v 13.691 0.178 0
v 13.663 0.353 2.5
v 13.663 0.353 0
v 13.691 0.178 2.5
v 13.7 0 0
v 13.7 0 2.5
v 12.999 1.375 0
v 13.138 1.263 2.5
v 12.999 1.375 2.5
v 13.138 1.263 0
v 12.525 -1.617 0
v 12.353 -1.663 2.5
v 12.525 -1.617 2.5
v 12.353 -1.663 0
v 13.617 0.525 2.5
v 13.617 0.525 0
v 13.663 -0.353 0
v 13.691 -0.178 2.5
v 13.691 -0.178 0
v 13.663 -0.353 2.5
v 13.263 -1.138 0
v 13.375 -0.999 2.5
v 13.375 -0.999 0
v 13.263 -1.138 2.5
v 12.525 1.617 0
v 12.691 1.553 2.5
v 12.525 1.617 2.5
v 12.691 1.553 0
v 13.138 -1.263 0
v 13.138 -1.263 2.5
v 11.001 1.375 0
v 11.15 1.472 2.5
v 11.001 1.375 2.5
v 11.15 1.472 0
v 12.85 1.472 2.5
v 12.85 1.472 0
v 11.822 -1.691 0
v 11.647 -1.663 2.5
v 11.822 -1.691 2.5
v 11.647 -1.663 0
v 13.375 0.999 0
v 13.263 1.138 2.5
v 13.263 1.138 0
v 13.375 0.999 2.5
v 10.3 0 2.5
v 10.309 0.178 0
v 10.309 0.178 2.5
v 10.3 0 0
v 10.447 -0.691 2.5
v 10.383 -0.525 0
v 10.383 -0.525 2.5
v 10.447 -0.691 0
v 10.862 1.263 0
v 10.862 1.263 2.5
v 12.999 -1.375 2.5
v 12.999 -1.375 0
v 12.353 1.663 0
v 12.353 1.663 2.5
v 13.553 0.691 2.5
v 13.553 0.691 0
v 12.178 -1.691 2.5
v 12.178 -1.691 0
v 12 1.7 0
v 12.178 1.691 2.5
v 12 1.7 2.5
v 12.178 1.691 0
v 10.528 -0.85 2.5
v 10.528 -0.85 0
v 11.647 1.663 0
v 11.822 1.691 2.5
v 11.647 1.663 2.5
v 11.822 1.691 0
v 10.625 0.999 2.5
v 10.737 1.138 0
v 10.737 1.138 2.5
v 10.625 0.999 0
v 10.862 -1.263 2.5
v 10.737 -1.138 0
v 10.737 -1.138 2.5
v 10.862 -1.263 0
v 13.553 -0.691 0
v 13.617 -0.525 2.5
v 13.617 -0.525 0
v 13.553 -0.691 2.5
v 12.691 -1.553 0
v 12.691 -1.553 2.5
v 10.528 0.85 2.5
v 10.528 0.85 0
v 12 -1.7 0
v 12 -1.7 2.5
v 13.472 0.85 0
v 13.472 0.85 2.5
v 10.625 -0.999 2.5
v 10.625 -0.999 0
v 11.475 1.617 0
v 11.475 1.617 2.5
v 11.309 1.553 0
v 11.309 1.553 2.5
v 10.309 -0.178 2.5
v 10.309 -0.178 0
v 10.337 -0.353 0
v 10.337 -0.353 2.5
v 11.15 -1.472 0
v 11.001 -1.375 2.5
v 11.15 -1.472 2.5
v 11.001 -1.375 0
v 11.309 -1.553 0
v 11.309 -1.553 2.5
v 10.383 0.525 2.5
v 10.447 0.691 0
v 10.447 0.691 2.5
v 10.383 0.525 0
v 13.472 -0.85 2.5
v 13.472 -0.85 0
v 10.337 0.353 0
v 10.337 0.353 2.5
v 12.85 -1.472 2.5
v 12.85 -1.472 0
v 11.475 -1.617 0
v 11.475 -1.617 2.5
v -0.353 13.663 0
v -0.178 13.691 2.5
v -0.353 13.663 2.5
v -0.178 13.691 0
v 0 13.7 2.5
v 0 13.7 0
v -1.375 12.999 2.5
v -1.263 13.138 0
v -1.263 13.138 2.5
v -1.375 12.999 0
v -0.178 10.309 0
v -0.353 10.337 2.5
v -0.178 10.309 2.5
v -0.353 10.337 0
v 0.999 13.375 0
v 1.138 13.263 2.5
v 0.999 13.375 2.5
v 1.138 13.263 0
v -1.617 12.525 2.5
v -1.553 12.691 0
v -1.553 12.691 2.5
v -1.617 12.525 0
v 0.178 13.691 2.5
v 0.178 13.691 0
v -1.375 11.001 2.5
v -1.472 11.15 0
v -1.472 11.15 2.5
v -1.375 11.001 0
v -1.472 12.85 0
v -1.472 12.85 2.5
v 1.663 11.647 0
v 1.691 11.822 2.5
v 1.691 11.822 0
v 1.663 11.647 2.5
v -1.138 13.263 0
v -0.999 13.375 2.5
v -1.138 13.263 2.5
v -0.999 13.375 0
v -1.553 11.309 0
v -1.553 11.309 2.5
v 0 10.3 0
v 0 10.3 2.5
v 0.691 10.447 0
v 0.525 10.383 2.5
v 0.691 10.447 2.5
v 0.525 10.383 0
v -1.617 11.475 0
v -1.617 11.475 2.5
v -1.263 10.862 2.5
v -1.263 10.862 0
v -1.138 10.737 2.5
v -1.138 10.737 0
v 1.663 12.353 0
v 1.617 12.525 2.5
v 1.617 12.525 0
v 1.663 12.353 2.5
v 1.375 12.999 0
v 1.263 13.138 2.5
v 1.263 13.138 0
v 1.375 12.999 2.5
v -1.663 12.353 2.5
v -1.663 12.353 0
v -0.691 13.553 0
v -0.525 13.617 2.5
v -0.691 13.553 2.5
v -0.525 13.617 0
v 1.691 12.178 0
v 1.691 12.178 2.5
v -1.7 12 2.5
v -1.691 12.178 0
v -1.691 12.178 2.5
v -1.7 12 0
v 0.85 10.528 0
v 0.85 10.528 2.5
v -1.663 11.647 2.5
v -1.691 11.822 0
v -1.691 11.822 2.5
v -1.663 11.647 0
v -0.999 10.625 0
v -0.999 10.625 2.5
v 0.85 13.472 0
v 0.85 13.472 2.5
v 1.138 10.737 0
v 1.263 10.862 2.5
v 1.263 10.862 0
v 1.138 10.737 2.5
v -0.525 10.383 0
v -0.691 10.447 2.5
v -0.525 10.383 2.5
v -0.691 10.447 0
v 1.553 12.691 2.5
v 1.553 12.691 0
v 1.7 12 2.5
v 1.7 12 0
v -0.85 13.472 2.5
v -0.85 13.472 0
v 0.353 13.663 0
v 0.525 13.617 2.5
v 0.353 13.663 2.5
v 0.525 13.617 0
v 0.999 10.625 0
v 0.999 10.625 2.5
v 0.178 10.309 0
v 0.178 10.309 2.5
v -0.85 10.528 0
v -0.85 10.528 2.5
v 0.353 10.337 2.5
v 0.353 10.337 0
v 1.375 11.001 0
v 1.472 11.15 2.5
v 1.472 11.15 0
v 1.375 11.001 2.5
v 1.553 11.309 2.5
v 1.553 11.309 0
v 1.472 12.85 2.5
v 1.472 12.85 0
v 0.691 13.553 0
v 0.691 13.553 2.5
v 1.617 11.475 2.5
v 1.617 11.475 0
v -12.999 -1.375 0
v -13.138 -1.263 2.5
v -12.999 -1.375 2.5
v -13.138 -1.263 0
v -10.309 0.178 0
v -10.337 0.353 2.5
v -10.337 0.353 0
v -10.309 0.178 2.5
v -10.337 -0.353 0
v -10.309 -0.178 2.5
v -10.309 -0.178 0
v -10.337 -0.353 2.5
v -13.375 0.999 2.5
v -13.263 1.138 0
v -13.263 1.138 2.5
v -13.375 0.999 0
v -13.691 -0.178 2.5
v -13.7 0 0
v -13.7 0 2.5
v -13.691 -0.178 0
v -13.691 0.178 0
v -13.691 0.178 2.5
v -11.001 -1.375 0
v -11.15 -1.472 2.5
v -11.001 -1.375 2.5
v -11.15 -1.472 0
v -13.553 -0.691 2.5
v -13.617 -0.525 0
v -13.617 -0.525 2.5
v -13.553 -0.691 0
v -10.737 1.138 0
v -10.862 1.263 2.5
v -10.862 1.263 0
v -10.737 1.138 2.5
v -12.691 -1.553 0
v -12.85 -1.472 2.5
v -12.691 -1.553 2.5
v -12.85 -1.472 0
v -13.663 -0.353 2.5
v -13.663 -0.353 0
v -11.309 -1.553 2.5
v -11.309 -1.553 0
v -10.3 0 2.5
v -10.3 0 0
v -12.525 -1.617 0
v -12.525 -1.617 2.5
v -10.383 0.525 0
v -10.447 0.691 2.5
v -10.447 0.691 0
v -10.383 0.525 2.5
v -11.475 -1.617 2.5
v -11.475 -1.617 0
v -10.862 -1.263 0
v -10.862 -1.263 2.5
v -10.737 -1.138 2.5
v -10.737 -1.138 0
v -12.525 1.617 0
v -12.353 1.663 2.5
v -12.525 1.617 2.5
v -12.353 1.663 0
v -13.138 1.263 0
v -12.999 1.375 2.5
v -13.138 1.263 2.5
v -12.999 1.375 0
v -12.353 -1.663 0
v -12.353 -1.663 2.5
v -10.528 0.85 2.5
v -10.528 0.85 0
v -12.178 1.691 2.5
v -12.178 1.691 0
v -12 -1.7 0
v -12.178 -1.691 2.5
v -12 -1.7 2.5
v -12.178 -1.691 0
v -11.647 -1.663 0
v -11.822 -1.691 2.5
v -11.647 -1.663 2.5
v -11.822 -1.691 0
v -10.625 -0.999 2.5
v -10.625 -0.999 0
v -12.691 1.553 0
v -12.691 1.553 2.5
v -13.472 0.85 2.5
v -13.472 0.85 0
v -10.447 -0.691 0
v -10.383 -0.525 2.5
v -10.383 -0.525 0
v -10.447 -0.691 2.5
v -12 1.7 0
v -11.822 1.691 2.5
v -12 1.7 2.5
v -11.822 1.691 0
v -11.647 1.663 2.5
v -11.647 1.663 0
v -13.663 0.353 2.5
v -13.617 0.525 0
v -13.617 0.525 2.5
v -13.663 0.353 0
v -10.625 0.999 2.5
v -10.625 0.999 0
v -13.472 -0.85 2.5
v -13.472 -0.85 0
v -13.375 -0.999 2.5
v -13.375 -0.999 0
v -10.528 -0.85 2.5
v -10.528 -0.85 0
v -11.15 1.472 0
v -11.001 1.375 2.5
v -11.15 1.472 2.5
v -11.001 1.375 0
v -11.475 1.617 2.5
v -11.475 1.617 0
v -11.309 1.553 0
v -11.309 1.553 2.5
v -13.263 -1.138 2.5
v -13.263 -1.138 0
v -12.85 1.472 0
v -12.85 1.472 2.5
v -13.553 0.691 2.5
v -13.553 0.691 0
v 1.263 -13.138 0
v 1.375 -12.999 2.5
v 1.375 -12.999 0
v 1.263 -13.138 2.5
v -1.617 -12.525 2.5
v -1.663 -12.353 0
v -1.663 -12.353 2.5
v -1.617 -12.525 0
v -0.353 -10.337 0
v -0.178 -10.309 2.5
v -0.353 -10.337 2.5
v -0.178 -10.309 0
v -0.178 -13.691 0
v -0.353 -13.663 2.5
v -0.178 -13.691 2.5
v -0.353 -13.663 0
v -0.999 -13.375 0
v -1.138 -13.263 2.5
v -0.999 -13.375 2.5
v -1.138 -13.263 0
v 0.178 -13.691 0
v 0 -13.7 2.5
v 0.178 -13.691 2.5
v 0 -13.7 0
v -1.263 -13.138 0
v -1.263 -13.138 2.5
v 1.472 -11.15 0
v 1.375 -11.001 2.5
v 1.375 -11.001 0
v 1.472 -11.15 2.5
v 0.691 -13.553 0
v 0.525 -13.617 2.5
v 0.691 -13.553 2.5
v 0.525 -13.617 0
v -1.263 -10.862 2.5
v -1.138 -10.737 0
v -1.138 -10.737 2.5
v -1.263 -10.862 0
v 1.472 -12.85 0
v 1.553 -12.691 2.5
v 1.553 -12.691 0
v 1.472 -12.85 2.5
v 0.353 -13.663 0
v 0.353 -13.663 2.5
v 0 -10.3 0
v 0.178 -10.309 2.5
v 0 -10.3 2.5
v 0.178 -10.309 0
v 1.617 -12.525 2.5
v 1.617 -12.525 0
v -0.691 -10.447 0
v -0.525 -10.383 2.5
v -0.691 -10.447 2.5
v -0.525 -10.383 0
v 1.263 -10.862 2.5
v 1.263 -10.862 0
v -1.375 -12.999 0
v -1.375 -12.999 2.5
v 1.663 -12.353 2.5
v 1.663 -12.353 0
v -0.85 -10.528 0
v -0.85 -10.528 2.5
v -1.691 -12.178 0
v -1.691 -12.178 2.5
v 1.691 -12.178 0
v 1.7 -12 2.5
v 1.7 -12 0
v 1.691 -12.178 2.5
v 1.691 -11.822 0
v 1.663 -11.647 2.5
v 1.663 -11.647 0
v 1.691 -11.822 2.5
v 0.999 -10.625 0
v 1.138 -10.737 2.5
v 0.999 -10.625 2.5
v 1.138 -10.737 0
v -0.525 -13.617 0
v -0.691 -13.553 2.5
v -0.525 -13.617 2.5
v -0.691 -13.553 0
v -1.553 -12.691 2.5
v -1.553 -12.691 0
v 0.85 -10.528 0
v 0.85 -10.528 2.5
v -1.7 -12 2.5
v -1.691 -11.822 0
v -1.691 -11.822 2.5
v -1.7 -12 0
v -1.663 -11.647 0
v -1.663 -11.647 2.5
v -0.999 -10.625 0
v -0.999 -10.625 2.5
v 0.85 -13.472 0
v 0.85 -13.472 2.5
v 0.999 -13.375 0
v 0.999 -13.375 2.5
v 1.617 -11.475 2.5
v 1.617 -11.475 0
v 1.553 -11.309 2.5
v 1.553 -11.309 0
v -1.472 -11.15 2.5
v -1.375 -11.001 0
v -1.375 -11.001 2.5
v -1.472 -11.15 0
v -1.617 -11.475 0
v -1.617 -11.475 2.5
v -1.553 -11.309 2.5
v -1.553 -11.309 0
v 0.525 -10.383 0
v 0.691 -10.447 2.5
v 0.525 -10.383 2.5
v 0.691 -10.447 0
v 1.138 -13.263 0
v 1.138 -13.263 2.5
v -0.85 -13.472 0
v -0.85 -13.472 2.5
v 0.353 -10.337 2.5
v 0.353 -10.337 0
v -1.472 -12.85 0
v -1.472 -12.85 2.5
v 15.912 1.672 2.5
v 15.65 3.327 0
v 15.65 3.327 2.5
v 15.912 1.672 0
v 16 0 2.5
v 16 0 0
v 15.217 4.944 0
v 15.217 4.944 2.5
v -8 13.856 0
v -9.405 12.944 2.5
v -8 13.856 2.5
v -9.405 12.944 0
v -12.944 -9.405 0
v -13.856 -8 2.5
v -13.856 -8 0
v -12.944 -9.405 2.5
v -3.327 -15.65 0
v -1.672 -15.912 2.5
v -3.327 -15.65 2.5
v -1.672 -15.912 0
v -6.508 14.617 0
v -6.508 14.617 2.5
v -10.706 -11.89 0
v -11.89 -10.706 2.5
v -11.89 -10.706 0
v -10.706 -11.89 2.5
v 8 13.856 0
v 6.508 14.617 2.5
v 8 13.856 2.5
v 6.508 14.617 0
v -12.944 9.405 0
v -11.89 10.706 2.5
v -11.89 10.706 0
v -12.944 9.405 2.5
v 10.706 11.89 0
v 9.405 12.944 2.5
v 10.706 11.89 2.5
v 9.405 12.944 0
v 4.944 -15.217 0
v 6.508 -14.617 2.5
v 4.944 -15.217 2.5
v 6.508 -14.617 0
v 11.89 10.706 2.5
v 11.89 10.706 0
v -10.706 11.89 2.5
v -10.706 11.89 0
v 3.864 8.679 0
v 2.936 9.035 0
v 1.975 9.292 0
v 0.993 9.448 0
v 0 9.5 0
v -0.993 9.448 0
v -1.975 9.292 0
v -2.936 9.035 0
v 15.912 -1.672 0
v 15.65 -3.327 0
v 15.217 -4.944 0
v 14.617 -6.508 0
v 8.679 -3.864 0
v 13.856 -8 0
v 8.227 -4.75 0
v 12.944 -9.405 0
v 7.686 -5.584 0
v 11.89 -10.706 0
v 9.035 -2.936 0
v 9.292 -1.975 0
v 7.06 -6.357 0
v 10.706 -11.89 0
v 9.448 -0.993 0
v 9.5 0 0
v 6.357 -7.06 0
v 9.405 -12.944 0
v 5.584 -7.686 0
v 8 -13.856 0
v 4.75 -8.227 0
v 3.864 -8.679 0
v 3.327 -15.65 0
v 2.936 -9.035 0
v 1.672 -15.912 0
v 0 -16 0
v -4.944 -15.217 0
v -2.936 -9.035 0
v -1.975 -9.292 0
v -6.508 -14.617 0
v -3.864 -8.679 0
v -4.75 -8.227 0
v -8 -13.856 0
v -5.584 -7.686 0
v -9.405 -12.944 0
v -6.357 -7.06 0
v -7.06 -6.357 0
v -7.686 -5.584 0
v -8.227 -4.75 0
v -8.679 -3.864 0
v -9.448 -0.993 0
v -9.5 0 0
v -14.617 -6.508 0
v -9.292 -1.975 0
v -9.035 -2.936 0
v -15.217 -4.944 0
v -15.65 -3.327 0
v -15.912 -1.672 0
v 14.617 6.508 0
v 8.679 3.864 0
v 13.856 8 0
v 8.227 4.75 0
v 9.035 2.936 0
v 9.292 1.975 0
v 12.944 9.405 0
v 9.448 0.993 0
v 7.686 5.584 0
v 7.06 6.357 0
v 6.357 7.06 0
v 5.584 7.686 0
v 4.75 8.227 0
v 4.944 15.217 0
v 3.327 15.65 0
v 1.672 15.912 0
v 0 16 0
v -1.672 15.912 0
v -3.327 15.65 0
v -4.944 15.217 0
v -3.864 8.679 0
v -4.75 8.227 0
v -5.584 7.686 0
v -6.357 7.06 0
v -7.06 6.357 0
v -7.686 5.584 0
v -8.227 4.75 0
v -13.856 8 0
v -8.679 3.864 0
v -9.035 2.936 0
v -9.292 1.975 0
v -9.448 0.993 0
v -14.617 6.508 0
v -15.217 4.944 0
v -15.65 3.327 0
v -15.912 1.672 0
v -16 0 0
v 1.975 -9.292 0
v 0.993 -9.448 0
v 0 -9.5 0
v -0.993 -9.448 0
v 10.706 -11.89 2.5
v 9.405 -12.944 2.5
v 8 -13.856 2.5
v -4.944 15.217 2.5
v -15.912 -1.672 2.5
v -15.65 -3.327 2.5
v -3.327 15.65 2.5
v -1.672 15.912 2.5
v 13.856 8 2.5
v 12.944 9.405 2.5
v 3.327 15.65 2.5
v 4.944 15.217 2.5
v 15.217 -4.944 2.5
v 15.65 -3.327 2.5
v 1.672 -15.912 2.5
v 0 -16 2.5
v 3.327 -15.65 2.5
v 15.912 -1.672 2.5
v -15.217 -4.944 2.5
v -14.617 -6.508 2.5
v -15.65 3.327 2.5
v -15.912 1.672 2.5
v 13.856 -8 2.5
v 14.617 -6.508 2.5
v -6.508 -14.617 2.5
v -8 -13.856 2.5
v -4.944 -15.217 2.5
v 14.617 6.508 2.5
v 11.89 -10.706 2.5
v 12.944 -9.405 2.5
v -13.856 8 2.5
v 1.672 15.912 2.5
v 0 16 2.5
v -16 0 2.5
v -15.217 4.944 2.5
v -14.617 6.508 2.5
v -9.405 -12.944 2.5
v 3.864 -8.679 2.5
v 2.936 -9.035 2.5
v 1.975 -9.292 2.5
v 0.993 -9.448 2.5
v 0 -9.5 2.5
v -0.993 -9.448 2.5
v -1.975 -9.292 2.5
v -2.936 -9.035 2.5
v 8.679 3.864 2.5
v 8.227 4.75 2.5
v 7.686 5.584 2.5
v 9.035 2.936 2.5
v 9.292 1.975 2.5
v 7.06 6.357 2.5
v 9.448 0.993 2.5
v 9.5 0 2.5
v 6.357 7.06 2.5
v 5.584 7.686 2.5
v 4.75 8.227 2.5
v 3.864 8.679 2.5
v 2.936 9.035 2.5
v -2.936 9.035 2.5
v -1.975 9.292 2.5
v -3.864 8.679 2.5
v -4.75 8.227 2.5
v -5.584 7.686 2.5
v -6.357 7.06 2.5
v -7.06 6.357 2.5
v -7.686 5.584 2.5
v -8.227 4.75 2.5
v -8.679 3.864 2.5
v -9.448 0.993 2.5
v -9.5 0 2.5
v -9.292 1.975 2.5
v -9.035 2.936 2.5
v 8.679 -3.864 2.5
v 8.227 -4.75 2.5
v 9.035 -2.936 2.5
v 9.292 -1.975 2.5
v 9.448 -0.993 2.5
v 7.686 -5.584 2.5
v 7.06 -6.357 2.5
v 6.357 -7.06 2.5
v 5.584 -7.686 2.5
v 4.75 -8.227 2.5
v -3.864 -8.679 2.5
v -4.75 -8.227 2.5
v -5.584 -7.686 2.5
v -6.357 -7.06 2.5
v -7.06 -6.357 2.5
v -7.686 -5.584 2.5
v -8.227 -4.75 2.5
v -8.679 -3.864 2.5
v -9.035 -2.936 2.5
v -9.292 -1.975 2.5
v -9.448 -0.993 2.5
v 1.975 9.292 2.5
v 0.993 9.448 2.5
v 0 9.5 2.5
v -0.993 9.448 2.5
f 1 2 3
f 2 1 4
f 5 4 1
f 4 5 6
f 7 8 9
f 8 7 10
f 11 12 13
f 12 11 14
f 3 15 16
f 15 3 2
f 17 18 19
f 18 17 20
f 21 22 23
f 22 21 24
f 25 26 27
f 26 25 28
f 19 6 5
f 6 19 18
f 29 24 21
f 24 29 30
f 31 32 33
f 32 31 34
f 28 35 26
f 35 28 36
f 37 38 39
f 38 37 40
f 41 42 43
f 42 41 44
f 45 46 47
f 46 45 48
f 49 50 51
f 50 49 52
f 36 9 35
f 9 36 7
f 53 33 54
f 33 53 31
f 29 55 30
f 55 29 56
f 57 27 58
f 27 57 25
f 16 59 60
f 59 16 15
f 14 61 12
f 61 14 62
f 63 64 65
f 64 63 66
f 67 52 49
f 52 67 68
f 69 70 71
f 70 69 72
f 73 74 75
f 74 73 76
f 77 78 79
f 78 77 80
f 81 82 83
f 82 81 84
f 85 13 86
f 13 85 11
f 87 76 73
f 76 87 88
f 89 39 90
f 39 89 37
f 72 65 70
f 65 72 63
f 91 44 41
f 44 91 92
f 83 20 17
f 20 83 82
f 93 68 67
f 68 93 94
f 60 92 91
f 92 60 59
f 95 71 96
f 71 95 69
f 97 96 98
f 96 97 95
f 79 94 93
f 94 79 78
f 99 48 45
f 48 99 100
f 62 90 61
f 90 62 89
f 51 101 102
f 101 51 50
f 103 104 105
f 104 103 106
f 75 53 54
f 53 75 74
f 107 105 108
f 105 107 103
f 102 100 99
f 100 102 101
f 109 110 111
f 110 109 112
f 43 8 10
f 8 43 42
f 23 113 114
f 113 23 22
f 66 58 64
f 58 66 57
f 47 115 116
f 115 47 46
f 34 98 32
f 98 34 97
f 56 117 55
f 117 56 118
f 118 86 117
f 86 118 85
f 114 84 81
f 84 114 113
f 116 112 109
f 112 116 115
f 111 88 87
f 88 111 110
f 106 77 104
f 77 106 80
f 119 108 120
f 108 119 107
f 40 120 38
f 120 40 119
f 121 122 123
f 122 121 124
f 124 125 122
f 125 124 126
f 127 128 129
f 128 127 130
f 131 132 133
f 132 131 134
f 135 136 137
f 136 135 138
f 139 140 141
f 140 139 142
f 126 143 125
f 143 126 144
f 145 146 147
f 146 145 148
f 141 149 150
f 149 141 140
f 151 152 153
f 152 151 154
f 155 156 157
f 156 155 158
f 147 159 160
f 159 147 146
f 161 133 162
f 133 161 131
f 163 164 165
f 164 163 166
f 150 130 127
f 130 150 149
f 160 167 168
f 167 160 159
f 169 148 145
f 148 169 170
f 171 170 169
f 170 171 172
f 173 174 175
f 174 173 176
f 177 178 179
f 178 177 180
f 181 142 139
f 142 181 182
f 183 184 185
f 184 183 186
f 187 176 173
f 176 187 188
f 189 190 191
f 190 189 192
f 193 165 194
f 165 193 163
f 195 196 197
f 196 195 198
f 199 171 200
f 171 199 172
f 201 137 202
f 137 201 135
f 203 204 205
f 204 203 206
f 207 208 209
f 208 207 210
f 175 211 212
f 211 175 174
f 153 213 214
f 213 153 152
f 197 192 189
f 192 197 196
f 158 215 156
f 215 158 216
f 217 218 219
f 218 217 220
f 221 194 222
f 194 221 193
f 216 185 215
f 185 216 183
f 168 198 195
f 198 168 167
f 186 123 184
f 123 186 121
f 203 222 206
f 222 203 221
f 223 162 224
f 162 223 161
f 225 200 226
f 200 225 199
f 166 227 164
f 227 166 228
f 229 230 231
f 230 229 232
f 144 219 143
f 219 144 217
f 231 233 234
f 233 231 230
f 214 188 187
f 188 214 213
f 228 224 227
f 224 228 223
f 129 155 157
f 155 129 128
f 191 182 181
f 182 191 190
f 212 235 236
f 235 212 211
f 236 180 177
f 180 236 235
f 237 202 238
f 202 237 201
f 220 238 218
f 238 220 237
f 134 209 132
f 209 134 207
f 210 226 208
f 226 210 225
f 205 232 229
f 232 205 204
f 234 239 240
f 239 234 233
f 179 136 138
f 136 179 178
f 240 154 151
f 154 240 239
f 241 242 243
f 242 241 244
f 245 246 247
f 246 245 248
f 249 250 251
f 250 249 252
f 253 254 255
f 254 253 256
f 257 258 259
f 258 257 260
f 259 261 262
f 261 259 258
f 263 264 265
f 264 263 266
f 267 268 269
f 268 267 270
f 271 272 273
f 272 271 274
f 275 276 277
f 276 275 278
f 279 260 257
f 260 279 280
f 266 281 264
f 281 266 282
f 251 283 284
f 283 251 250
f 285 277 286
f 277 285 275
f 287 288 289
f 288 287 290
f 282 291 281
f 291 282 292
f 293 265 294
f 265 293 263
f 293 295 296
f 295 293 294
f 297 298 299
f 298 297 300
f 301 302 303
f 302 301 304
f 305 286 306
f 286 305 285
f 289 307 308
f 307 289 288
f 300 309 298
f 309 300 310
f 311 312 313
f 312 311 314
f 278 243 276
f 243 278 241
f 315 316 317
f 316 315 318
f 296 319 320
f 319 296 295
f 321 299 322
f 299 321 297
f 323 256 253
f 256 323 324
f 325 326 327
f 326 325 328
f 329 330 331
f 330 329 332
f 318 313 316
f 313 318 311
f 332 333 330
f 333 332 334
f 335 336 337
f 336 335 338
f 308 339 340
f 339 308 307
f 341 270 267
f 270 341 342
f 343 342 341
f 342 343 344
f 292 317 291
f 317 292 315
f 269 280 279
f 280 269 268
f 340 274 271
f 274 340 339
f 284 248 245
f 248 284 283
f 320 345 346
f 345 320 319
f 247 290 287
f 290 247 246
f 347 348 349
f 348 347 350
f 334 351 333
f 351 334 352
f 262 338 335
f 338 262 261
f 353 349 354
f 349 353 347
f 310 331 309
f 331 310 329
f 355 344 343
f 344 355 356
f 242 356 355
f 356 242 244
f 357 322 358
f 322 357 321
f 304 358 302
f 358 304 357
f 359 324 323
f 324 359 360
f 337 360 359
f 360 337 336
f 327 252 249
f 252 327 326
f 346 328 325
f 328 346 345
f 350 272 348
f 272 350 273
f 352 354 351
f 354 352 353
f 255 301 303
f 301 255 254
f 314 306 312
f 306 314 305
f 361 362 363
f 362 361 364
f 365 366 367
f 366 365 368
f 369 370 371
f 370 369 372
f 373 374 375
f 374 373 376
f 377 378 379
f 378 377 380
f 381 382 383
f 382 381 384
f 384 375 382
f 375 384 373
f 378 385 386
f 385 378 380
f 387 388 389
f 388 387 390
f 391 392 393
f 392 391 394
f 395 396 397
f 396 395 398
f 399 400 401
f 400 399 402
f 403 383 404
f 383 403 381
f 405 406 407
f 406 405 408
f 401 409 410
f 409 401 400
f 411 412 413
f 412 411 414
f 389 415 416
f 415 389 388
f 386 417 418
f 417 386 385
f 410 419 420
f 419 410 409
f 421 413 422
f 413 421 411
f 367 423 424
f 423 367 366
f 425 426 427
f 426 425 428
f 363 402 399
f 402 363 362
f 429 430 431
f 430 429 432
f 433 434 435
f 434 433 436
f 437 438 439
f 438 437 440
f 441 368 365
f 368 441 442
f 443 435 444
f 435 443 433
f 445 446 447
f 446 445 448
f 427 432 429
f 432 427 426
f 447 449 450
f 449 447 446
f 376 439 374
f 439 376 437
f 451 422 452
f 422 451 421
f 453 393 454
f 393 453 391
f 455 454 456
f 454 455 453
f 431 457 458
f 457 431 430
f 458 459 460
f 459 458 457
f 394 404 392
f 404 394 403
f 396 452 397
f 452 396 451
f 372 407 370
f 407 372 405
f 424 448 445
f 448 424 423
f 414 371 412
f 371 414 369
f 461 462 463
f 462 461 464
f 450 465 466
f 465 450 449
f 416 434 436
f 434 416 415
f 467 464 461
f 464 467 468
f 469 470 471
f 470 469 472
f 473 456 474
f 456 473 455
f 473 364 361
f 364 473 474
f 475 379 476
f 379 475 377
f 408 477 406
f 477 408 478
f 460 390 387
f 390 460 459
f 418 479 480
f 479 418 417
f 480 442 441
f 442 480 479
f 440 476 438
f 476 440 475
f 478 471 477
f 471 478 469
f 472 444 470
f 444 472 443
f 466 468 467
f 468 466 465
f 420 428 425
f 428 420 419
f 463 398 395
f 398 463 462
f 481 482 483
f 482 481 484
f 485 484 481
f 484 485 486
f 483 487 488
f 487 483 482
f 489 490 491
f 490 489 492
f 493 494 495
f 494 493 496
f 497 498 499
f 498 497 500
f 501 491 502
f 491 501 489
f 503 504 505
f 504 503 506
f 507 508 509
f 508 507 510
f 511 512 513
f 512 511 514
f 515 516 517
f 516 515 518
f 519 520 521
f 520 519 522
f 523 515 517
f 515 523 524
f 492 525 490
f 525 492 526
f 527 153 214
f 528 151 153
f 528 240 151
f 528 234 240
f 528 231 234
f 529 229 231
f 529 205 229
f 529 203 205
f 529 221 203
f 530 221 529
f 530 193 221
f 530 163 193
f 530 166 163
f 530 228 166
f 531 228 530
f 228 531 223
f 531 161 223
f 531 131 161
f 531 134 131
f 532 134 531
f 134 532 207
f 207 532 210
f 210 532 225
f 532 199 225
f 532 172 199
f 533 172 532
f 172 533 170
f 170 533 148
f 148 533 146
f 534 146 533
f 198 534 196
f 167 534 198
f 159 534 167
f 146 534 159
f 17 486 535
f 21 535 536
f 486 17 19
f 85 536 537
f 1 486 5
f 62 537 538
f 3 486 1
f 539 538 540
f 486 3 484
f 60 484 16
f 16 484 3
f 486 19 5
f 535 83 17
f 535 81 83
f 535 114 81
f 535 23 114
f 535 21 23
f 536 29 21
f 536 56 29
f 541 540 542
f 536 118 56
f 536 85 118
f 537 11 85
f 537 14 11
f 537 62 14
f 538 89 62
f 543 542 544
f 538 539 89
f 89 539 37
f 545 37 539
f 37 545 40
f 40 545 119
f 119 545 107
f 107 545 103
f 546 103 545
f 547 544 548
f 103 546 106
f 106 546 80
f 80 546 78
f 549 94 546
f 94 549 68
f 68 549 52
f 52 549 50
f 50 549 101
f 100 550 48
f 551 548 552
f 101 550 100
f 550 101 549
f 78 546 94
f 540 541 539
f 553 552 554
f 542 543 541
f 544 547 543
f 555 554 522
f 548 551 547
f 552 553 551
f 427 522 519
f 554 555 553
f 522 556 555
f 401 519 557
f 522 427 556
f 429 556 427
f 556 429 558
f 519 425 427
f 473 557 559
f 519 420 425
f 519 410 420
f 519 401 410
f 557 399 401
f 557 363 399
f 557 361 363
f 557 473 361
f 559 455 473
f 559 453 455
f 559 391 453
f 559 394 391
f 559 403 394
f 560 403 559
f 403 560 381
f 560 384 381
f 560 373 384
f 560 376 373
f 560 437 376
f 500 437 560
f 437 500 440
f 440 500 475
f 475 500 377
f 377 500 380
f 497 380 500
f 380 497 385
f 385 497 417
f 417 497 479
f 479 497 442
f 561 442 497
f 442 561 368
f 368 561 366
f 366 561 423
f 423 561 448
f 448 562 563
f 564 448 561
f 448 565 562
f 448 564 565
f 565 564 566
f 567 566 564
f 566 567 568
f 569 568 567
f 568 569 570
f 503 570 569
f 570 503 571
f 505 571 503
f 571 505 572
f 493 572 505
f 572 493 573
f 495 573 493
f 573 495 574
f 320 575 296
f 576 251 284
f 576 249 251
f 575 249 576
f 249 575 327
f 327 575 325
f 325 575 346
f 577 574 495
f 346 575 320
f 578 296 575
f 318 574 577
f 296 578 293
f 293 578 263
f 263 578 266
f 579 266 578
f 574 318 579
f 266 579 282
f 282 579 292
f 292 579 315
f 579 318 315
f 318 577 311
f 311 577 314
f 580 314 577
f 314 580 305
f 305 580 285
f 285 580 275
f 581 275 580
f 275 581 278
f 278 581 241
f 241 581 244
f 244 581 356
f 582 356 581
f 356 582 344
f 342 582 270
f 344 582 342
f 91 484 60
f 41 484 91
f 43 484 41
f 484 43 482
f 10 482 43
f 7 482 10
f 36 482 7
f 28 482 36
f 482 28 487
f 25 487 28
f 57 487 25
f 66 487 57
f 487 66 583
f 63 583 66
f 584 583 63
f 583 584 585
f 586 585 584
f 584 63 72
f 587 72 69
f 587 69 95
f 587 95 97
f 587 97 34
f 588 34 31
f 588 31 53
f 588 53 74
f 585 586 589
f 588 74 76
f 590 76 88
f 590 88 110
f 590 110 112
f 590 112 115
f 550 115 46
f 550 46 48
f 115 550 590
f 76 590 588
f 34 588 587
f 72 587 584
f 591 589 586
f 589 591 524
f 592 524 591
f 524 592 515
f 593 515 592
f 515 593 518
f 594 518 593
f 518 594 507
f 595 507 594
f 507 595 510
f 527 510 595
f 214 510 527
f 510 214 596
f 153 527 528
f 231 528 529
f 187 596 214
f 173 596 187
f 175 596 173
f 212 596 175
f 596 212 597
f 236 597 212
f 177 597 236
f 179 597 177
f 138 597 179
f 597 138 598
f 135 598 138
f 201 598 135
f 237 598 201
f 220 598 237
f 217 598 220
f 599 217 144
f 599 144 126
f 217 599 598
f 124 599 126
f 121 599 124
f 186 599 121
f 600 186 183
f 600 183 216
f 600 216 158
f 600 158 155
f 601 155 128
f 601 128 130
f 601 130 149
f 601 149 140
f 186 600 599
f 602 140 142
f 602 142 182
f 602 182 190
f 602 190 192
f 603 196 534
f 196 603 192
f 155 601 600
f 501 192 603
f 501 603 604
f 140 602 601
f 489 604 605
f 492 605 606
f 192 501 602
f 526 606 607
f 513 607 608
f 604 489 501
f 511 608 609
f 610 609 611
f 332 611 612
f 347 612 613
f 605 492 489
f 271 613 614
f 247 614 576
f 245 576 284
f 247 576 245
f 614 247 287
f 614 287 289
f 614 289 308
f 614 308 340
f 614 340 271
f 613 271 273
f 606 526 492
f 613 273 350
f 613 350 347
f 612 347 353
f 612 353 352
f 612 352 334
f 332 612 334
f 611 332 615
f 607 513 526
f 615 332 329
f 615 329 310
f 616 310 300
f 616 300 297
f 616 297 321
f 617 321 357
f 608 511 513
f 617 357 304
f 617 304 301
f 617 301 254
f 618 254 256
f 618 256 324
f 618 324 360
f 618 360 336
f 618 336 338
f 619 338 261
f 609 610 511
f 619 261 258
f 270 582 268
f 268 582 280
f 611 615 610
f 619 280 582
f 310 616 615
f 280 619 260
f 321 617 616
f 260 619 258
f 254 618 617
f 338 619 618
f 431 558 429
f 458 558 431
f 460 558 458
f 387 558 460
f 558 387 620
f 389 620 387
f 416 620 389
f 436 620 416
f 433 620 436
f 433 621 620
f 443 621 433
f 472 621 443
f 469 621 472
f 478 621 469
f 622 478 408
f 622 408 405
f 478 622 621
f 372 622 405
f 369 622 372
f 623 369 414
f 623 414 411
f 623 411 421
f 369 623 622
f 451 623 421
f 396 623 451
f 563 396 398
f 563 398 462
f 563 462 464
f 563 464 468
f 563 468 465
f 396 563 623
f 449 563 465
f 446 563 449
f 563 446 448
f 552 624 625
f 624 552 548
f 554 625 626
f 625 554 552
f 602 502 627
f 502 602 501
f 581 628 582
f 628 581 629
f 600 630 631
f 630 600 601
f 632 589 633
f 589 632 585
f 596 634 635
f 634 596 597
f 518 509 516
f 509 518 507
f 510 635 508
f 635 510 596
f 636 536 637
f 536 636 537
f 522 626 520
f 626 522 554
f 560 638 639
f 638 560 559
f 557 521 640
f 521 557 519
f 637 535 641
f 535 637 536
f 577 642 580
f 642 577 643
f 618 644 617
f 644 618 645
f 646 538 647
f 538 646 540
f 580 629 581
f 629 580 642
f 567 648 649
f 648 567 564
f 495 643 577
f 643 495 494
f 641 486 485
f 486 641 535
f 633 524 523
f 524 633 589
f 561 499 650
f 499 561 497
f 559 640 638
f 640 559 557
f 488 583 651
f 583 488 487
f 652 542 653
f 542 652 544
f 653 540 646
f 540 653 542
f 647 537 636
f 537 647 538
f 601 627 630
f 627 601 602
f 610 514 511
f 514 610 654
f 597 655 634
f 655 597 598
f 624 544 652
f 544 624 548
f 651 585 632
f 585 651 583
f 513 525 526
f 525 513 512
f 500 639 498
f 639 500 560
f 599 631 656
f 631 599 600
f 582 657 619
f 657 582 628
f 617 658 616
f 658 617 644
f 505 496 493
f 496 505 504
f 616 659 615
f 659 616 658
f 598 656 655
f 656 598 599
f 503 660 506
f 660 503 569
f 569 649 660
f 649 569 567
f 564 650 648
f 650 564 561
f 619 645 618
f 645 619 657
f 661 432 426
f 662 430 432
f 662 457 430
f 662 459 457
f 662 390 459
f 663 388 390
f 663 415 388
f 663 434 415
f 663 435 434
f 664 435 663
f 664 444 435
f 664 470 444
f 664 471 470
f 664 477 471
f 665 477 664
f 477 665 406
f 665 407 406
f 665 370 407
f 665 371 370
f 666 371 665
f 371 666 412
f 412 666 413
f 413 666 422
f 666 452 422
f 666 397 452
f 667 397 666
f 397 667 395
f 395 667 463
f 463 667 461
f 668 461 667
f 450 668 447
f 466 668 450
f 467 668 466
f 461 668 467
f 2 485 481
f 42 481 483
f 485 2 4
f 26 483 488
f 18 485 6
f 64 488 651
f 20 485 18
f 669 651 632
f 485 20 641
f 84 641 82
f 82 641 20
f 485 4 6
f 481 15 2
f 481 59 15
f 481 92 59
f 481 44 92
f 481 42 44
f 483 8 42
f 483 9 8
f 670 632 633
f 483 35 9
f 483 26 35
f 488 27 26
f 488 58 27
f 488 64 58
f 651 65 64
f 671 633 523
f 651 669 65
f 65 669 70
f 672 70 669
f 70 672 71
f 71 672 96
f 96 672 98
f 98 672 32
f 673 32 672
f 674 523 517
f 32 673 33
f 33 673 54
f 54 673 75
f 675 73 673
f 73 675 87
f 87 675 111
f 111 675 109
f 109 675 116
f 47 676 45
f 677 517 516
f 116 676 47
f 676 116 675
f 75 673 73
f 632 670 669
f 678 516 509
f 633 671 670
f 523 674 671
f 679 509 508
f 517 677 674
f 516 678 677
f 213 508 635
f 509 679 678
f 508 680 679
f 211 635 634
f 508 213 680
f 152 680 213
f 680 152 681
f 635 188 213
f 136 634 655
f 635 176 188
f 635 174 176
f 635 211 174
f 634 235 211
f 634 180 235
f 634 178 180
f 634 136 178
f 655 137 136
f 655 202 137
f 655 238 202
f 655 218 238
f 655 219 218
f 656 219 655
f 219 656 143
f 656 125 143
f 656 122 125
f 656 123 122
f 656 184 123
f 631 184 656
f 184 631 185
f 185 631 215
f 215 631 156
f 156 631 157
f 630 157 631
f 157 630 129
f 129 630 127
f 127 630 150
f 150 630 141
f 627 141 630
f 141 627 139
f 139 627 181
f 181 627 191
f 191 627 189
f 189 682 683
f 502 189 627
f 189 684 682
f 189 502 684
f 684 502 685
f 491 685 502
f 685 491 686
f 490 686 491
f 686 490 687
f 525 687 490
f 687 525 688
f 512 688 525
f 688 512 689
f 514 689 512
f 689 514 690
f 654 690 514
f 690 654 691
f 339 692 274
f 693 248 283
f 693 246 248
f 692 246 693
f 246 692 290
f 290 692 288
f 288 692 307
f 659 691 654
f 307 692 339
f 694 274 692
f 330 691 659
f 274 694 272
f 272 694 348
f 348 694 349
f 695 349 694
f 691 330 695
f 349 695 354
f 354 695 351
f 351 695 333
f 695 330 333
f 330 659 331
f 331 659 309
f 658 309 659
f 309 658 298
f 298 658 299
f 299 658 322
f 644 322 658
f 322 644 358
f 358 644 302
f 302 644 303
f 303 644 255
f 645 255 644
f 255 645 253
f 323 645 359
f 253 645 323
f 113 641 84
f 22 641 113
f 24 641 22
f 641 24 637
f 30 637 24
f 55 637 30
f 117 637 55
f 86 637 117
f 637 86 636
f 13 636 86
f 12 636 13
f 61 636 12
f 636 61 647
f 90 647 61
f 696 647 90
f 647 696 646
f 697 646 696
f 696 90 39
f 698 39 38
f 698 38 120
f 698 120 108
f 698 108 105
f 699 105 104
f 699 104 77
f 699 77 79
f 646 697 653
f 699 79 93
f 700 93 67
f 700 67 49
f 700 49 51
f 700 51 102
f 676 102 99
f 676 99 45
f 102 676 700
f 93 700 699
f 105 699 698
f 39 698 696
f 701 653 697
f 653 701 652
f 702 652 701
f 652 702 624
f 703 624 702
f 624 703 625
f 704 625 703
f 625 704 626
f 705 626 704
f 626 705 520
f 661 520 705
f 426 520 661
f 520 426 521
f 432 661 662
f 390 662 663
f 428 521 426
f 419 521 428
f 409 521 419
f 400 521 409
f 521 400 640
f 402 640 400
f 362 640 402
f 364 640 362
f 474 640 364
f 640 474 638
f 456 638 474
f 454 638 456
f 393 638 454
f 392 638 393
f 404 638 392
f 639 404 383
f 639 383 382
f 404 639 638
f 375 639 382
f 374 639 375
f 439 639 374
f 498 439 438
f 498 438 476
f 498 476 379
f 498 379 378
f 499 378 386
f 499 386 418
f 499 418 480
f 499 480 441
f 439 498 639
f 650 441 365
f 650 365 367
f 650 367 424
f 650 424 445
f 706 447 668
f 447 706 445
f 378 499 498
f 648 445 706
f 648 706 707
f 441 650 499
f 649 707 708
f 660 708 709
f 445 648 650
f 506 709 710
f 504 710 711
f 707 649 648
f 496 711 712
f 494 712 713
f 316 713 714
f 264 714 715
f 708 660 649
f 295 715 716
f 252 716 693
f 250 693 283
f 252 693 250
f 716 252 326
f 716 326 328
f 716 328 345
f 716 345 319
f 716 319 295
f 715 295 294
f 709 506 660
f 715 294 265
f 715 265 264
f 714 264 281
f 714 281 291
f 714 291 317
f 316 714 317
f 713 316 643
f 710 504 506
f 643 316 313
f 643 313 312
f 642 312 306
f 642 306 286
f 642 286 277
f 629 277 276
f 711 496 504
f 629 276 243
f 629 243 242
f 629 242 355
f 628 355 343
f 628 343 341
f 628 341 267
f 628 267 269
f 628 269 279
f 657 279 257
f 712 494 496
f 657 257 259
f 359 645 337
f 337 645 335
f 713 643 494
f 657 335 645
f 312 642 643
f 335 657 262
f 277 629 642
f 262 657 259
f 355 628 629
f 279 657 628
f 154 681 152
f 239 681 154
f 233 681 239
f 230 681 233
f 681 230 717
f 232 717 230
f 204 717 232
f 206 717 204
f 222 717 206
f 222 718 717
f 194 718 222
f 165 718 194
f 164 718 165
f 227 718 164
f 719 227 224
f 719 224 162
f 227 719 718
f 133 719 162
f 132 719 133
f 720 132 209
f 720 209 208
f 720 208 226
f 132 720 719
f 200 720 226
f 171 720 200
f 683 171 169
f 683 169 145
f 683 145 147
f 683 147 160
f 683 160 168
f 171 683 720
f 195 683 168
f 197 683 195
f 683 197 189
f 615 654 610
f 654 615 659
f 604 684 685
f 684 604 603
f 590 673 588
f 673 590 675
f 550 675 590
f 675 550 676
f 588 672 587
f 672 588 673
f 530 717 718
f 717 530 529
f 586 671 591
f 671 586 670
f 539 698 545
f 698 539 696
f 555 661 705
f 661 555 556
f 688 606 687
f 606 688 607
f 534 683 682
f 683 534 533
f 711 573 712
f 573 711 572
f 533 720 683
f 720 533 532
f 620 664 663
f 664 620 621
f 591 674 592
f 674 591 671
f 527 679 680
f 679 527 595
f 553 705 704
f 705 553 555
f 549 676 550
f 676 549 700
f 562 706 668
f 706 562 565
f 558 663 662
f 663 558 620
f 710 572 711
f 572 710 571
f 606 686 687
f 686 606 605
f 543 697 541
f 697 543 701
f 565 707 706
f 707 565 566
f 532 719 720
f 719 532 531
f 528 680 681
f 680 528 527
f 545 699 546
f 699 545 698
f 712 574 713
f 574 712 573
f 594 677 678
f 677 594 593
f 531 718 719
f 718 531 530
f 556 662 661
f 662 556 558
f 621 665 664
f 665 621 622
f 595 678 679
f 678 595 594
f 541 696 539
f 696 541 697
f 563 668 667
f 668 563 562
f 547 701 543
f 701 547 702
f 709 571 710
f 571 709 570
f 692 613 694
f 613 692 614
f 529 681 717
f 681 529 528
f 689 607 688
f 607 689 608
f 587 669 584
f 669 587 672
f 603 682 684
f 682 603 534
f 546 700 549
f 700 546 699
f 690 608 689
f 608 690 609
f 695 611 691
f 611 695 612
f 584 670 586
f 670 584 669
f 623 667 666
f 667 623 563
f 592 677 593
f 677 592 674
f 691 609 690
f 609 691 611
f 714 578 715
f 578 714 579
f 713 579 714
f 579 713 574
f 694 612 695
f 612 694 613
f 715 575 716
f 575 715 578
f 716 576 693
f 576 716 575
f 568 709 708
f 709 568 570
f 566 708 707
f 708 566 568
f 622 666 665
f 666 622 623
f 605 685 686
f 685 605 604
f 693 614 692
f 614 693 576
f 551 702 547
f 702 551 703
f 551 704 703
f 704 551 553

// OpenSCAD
// Bearing retaining ring.
$fn = 60;
eps = 0.02;
bearing_d = 19;
outer_d = 32;
thickness = 2.5;
difference() {
    cylinder(d=outer_d,h=thickness);
    translate([0,0,-eps]) cylinder(d=bearing_d,h=thickness+2*eps);
    for (i=[0:3]) rotate([0,0,i*90]) translate([outer_d/2-4,0,-eps]) cylinder(d=3.4,h=thickness+2*eps);
}
